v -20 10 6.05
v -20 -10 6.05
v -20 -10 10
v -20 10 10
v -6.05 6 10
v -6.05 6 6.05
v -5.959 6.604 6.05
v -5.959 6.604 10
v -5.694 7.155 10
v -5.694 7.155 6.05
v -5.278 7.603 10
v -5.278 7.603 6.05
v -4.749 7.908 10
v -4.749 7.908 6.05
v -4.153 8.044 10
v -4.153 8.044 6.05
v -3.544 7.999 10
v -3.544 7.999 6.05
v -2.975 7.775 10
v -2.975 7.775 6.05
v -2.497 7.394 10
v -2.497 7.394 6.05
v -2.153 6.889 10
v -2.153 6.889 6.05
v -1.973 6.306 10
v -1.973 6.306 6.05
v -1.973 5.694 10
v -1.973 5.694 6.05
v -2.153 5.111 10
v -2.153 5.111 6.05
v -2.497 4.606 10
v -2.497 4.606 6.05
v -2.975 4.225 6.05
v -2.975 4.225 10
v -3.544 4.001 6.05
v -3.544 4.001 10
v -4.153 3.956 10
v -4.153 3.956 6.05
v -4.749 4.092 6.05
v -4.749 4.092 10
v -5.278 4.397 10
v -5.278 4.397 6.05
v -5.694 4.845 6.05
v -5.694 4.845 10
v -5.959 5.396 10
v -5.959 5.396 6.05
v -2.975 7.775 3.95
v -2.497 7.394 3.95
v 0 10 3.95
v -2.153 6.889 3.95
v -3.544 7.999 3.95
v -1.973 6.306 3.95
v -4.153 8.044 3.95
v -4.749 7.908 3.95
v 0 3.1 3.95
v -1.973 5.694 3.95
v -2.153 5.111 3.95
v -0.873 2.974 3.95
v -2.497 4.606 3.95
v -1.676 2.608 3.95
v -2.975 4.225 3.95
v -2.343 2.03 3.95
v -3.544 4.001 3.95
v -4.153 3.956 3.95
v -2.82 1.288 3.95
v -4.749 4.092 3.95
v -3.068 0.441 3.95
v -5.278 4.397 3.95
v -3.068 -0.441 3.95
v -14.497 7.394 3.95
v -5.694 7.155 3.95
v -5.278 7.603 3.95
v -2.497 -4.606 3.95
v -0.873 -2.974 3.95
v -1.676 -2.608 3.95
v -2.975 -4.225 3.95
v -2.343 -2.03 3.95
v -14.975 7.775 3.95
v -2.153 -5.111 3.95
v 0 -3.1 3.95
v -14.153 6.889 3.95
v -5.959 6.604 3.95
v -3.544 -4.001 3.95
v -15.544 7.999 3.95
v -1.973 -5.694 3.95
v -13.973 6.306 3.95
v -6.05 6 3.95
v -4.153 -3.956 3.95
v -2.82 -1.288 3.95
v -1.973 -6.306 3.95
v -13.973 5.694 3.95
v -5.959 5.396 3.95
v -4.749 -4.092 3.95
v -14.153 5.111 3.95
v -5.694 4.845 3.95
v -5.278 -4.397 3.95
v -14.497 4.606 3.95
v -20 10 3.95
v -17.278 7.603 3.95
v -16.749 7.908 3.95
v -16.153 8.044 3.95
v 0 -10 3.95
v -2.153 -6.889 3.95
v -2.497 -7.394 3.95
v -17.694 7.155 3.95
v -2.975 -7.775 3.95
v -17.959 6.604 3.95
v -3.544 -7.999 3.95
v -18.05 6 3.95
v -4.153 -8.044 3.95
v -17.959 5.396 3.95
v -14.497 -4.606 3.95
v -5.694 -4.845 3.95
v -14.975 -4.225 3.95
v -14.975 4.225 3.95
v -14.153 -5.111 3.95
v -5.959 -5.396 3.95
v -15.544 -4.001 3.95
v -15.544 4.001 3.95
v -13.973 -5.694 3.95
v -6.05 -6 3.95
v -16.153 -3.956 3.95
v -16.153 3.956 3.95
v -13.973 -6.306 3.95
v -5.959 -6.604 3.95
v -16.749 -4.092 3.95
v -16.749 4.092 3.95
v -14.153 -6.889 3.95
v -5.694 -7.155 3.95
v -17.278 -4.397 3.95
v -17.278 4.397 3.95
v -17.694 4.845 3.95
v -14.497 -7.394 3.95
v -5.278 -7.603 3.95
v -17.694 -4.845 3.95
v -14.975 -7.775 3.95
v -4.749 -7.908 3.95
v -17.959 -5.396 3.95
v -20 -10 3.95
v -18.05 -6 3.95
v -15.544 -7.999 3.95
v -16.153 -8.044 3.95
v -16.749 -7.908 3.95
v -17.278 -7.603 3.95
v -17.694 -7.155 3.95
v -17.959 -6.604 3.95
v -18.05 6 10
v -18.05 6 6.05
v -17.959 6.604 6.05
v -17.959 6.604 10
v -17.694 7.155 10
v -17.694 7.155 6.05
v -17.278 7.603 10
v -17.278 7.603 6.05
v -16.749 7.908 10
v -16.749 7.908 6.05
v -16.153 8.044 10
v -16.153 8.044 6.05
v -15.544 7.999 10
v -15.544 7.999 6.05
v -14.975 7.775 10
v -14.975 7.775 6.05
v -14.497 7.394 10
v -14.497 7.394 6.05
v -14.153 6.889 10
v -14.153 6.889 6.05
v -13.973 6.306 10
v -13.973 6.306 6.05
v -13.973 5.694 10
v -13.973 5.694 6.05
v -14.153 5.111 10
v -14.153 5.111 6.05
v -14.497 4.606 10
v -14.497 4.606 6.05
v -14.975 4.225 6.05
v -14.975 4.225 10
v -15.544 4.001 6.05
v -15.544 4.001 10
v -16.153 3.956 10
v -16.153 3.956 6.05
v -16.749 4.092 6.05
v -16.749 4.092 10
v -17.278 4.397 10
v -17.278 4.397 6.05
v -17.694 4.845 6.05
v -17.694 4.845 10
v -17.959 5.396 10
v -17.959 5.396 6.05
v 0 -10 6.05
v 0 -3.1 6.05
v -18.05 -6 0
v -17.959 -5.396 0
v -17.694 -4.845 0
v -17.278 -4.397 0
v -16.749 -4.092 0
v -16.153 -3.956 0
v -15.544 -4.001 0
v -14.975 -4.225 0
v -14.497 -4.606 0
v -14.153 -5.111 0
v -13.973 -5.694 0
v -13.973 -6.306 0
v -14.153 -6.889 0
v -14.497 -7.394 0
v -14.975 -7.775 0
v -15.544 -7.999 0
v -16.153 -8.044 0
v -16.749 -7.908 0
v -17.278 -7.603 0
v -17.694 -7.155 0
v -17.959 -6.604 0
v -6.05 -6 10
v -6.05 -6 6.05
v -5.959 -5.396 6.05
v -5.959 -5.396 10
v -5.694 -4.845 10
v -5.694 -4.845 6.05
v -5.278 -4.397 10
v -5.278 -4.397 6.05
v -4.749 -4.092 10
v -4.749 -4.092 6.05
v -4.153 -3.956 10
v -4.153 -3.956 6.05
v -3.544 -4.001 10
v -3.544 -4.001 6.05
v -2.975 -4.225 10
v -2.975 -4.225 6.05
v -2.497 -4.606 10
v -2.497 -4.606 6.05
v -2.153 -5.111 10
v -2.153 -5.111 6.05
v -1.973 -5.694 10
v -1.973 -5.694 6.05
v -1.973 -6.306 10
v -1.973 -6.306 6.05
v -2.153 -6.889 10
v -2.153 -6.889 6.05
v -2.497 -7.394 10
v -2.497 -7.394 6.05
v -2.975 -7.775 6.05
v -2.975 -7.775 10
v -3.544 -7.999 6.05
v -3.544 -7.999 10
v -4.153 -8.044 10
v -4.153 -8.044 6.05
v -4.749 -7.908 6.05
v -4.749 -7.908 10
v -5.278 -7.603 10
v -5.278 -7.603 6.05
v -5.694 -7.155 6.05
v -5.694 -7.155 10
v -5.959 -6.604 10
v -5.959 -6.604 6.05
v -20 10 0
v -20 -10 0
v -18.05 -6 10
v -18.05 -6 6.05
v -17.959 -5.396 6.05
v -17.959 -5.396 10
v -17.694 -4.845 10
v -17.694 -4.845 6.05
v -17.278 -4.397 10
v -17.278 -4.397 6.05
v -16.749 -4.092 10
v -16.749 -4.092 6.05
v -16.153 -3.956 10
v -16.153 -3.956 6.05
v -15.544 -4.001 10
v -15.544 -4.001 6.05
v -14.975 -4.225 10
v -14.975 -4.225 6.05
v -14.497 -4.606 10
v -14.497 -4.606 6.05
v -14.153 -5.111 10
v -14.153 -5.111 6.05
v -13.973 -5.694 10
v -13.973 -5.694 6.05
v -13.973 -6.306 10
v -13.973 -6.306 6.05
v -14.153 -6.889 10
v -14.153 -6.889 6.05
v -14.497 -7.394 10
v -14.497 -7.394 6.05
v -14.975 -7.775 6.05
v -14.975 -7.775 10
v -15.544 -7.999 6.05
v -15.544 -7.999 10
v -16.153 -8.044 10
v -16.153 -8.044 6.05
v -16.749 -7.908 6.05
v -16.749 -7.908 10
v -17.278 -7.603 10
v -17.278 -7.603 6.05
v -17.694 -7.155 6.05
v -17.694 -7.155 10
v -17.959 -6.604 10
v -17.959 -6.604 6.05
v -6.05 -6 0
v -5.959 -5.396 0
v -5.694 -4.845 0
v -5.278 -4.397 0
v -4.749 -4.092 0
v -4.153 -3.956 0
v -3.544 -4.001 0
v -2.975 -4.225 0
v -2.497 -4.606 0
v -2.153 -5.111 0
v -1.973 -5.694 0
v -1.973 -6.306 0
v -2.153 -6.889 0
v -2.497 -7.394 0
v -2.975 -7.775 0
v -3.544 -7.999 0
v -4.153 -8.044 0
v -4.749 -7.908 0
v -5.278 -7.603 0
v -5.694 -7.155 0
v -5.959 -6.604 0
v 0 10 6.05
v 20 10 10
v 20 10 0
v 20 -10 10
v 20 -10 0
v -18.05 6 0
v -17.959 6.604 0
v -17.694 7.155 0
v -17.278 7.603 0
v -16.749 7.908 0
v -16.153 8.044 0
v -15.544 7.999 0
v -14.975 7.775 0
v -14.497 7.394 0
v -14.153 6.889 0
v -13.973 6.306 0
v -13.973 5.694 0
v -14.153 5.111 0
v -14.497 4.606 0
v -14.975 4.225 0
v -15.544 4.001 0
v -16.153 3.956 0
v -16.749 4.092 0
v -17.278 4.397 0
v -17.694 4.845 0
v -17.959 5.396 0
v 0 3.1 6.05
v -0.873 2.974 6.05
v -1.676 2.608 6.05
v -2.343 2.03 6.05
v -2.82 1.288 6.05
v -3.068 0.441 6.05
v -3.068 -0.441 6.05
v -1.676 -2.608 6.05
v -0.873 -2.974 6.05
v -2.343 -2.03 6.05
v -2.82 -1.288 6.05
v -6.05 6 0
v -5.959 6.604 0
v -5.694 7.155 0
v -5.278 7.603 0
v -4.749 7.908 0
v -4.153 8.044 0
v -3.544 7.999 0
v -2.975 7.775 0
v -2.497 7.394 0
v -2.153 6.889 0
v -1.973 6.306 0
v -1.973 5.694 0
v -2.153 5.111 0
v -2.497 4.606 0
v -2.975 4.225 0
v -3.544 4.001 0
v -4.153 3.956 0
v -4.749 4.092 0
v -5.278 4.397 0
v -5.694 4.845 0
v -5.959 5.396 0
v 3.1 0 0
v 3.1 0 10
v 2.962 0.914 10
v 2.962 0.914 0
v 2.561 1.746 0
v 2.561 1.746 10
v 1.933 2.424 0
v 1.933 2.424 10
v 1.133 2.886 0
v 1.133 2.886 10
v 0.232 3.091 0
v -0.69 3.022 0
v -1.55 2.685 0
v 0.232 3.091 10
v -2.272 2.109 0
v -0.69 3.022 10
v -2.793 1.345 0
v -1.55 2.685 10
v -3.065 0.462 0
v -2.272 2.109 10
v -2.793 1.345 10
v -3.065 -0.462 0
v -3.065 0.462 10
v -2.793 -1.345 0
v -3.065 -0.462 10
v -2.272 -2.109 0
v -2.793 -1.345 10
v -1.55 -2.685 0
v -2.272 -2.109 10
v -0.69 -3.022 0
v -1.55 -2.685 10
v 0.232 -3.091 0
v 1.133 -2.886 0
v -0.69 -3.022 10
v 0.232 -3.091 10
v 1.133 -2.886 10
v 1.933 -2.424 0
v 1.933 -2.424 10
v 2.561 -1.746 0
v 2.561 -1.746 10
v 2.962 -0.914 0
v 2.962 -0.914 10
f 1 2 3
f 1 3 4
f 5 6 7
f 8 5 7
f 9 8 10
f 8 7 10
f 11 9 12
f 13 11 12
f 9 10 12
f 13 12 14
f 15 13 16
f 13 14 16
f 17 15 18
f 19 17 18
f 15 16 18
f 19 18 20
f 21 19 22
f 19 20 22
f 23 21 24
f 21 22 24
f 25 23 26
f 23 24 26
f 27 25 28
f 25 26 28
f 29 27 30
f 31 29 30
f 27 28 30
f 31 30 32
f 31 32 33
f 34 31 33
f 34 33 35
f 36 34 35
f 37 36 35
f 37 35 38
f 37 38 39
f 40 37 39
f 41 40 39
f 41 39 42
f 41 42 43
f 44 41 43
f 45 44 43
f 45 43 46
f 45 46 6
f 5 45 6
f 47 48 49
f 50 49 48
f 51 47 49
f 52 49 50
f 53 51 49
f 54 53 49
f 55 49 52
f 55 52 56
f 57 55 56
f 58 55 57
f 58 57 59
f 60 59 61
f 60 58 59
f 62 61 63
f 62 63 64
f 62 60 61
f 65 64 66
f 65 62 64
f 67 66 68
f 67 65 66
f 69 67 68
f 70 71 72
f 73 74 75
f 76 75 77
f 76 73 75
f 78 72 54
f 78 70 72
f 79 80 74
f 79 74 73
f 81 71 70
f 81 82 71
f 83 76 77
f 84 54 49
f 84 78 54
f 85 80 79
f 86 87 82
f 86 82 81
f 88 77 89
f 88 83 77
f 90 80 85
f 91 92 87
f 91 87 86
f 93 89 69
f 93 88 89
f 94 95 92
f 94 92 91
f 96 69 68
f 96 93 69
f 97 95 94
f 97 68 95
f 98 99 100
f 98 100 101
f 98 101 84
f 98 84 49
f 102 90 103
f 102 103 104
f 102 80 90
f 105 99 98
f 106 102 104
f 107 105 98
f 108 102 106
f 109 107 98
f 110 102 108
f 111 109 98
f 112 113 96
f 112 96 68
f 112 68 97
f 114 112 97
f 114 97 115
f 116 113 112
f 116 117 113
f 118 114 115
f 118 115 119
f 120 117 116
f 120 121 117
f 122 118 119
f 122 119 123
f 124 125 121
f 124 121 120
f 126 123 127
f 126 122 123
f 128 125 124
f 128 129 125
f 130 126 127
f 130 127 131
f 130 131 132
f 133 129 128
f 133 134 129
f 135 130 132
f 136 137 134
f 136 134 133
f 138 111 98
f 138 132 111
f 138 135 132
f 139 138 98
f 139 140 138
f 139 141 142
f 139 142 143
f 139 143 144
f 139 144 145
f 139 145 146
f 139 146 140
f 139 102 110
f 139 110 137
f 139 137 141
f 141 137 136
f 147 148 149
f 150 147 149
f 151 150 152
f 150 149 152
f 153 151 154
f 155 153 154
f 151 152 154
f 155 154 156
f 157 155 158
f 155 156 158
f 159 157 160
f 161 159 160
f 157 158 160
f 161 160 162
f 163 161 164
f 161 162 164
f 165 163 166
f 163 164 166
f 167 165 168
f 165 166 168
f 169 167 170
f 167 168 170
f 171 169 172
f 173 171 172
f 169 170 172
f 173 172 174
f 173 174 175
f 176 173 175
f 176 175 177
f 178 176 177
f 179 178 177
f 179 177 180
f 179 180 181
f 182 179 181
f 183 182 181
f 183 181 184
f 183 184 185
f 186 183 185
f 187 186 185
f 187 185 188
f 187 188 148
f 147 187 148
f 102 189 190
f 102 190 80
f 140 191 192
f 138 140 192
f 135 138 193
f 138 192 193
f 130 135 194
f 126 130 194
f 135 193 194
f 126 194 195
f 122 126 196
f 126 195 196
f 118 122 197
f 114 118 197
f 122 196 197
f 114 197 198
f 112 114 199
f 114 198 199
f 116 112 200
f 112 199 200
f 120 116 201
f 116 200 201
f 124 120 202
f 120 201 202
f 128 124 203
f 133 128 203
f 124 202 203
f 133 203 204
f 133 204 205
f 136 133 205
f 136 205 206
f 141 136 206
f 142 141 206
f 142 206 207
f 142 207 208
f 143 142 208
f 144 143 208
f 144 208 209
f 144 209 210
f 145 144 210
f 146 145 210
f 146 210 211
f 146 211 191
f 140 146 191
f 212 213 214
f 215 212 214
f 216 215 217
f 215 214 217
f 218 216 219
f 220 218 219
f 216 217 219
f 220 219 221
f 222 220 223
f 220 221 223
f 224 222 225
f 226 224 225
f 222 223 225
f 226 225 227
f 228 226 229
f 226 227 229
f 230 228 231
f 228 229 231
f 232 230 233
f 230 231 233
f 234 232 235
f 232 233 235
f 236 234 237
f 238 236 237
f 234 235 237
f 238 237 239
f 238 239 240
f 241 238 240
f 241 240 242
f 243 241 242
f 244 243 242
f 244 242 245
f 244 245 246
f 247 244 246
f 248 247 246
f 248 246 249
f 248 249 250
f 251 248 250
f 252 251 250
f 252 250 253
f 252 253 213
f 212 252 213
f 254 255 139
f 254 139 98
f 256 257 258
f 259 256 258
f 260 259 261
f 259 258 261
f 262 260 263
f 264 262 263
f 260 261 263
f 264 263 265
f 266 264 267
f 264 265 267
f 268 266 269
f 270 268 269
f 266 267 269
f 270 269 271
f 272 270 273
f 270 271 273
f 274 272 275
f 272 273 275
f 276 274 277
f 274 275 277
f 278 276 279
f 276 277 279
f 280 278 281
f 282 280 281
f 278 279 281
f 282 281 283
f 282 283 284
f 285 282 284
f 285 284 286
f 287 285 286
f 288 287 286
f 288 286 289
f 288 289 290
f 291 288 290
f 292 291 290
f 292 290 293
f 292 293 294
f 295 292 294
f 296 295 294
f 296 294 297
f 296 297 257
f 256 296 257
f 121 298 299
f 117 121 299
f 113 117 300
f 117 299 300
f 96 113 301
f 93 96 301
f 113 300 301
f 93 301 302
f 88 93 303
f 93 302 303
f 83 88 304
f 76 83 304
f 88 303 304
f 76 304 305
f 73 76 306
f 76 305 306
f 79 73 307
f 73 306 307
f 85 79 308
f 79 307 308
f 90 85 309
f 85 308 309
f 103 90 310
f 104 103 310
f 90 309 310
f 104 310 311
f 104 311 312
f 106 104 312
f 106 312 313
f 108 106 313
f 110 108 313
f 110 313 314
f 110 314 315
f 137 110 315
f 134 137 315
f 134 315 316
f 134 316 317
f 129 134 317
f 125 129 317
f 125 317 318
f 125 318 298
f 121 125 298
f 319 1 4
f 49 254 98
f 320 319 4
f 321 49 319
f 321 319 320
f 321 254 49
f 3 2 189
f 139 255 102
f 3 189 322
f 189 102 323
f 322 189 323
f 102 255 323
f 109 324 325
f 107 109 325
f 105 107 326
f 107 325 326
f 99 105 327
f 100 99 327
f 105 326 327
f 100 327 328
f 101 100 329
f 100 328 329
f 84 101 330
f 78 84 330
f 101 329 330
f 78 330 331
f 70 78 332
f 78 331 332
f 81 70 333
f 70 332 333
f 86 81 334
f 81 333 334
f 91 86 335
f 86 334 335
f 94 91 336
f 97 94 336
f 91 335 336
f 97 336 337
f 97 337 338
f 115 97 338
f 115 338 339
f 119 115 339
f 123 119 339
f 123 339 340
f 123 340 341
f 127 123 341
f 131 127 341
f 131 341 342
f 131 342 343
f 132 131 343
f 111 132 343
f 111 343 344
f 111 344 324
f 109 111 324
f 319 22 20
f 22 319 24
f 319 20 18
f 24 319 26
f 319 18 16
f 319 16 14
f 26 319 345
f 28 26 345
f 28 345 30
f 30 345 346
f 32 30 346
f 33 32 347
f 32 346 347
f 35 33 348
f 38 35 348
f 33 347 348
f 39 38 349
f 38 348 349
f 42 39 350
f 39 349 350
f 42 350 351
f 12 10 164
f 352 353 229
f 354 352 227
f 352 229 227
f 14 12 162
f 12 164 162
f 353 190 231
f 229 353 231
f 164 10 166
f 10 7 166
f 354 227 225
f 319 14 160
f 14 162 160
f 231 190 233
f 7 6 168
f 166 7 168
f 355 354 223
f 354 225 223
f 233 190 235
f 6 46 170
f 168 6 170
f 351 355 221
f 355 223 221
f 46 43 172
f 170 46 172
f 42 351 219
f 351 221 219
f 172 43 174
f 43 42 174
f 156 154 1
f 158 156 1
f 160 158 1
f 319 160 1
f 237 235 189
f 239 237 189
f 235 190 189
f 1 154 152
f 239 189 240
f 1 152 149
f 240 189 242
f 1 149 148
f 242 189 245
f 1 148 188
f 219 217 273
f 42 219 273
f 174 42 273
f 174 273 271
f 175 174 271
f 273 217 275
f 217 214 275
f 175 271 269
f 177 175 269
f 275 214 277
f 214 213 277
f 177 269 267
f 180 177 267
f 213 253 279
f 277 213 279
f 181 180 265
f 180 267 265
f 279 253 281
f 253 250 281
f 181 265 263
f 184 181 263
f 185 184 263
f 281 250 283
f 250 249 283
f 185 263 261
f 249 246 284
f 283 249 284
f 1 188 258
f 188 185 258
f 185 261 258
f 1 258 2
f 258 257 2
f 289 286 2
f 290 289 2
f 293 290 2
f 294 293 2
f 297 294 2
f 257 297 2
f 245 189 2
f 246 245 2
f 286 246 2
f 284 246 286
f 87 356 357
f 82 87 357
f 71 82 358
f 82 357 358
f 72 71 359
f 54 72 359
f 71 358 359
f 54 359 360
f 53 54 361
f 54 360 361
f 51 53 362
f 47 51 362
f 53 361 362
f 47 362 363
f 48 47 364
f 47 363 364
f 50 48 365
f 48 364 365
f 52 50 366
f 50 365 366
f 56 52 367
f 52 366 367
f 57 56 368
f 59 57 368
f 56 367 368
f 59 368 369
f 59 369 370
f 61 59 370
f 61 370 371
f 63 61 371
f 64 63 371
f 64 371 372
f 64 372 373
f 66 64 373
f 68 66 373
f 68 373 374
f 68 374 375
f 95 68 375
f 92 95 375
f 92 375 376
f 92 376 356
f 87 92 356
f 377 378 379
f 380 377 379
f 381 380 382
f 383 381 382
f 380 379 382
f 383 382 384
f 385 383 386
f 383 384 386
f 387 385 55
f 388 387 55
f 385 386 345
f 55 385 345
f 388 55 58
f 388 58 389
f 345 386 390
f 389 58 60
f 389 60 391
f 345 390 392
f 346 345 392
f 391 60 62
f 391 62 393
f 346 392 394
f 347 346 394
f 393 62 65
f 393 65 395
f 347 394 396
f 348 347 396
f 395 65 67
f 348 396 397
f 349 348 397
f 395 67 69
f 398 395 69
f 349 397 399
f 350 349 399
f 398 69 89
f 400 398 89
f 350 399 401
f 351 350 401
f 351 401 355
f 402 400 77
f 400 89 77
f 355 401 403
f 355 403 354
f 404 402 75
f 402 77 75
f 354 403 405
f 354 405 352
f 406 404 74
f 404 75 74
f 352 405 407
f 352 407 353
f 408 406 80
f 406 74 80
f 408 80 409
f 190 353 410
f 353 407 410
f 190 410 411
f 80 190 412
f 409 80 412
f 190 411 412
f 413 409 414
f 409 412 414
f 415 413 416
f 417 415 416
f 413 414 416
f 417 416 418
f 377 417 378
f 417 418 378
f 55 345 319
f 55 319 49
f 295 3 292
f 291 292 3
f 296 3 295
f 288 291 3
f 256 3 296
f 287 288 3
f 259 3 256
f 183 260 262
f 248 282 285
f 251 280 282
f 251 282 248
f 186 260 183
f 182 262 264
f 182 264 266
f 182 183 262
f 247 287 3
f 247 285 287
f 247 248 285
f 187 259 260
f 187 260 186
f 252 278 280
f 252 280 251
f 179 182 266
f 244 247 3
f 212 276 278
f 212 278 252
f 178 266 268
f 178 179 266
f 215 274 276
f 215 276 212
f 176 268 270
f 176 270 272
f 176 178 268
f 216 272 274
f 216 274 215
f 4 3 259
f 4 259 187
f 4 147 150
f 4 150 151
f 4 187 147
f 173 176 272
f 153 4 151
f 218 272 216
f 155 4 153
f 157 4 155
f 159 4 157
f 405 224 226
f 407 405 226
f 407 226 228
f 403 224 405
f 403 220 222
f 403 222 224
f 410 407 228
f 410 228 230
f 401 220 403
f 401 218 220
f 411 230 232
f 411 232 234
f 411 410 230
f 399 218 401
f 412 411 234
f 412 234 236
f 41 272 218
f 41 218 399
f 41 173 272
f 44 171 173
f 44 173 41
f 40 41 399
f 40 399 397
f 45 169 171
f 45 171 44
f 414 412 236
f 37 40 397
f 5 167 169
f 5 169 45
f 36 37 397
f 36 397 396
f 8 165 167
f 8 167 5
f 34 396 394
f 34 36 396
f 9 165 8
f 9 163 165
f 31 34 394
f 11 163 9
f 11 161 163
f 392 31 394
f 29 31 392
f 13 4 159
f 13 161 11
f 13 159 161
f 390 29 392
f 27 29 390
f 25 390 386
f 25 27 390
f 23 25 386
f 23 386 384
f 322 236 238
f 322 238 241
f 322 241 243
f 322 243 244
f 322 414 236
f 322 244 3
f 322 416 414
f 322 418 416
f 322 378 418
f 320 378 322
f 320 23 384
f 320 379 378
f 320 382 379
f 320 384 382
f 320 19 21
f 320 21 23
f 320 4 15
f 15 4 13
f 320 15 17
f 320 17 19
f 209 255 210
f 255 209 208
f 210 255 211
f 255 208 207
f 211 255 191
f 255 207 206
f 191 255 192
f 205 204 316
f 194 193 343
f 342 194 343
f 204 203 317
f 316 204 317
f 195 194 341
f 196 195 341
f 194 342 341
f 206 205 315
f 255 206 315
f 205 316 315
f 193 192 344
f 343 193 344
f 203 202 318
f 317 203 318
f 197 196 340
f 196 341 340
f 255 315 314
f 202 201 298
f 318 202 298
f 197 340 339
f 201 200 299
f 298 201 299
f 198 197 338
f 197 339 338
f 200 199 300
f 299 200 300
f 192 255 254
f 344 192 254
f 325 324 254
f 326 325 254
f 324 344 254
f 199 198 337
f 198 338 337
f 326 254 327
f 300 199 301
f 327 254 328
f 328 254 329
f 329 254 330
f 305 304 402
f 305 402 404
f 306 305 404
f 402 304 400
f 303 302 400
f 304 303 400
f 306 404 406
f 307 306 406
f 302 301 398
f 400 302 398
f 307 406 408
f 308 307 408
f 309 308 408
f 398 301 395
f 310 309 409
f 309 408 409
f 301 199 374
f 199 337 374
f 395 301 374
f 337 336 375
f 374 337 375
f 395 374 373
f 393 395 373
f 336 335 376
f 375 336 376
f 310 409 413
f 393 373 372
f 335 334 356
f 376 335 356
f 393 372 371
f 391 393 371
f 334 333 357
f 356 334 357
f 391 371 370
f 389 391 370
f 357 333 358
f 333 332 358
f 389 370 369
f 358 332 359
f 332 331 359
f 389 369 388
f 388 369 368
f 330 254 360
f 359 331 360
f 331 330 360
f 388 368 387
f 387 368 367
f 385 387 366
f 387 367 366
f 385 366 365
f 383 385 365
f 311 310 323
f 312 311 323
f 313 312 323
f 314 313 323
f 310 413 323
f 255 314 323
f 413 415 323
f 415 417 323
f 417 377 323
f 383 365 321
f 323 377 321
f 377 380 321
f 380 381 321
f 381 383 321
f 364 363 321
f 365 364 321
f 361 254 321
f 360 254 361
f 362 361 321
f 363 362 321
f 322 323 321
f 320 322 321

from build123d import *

# Parameters (mm, degrees)
ESQUISSE1_W             = 40
ESQUISSE1_H             = 20
BOSS_EXTRU_1_DEPTH      = 10
ESQUISSE2_R             = 3.1
ENL_V_MAT_EXTRU_1_DEPTH = 10
ESQUISSE3_W             = 40
ESQUISSE3_H             = 2.1
ENL_V_MAT_EXTRU_2_DEPTH = 31
ESQUISSE4_R             = 2.05
ENL_V_MAT_EXTRU_3_DEPTH = 25.494897428


with BuildPart() as part:
    # Esquisse1 → Boss.-Extru.1 (new body)
    with BuildSketch(Plane.XY):
        Rectangle(ESQUISSE1_W, ESQUISSE1_H)
    extrude(amount=BOSS_EXTRU_1_DEPTH)

    # Esquisse2 → Enlèv. mat.-Extru.1 (cut)
    with BuildSketch(Plane.XY.offset(10)):
        Circle(ESQUISSE2_R)
    extrude(amount=-ENL_V_MAT_EXTRU_1_DEPTH, mode=Mode.SUBTRACT)

    # Esquisse3 → Enlèv. mat.-Extru.2 (cut, through all)
    with BuildSketch(Plane(origin=(0, -10, 0), x_dir=(-1, 0, 0), z_dir=(0, -1, 0))):
        with Locations((20, -5)):
            Rectangle(ESQUISSE3_W, ESQUISSE3_H)
    extrude(amount=-ENL_V_MAT_EXTRU_2_DEPTH, mode=Mode.SUBTRACT)

    # Esquisse4 → Enlèv. mat.-Extru.3 (cut, through all)
    with BuildSketch(Plane(origin=(0, 0, 0), x_dir=(-1, 0, 0), z_dir=(0, 0, -1))):
        with Locations((16, 6)):
            Circle(ESQUISSE4_R)
        with Locations((4, 6)):
            Circle(ESQUISSE4_R)
        with Locations((4, -6)):
            Circle(ESQUISSE4_R)
        with Locations((16, -6)):
            Circle(ESQUISSE4_R)
    extrude(amount=-ENL_V_MAT_EXTRU_3_DEPTH, mode=Mode.SUBTRACT)


solid = part.part
